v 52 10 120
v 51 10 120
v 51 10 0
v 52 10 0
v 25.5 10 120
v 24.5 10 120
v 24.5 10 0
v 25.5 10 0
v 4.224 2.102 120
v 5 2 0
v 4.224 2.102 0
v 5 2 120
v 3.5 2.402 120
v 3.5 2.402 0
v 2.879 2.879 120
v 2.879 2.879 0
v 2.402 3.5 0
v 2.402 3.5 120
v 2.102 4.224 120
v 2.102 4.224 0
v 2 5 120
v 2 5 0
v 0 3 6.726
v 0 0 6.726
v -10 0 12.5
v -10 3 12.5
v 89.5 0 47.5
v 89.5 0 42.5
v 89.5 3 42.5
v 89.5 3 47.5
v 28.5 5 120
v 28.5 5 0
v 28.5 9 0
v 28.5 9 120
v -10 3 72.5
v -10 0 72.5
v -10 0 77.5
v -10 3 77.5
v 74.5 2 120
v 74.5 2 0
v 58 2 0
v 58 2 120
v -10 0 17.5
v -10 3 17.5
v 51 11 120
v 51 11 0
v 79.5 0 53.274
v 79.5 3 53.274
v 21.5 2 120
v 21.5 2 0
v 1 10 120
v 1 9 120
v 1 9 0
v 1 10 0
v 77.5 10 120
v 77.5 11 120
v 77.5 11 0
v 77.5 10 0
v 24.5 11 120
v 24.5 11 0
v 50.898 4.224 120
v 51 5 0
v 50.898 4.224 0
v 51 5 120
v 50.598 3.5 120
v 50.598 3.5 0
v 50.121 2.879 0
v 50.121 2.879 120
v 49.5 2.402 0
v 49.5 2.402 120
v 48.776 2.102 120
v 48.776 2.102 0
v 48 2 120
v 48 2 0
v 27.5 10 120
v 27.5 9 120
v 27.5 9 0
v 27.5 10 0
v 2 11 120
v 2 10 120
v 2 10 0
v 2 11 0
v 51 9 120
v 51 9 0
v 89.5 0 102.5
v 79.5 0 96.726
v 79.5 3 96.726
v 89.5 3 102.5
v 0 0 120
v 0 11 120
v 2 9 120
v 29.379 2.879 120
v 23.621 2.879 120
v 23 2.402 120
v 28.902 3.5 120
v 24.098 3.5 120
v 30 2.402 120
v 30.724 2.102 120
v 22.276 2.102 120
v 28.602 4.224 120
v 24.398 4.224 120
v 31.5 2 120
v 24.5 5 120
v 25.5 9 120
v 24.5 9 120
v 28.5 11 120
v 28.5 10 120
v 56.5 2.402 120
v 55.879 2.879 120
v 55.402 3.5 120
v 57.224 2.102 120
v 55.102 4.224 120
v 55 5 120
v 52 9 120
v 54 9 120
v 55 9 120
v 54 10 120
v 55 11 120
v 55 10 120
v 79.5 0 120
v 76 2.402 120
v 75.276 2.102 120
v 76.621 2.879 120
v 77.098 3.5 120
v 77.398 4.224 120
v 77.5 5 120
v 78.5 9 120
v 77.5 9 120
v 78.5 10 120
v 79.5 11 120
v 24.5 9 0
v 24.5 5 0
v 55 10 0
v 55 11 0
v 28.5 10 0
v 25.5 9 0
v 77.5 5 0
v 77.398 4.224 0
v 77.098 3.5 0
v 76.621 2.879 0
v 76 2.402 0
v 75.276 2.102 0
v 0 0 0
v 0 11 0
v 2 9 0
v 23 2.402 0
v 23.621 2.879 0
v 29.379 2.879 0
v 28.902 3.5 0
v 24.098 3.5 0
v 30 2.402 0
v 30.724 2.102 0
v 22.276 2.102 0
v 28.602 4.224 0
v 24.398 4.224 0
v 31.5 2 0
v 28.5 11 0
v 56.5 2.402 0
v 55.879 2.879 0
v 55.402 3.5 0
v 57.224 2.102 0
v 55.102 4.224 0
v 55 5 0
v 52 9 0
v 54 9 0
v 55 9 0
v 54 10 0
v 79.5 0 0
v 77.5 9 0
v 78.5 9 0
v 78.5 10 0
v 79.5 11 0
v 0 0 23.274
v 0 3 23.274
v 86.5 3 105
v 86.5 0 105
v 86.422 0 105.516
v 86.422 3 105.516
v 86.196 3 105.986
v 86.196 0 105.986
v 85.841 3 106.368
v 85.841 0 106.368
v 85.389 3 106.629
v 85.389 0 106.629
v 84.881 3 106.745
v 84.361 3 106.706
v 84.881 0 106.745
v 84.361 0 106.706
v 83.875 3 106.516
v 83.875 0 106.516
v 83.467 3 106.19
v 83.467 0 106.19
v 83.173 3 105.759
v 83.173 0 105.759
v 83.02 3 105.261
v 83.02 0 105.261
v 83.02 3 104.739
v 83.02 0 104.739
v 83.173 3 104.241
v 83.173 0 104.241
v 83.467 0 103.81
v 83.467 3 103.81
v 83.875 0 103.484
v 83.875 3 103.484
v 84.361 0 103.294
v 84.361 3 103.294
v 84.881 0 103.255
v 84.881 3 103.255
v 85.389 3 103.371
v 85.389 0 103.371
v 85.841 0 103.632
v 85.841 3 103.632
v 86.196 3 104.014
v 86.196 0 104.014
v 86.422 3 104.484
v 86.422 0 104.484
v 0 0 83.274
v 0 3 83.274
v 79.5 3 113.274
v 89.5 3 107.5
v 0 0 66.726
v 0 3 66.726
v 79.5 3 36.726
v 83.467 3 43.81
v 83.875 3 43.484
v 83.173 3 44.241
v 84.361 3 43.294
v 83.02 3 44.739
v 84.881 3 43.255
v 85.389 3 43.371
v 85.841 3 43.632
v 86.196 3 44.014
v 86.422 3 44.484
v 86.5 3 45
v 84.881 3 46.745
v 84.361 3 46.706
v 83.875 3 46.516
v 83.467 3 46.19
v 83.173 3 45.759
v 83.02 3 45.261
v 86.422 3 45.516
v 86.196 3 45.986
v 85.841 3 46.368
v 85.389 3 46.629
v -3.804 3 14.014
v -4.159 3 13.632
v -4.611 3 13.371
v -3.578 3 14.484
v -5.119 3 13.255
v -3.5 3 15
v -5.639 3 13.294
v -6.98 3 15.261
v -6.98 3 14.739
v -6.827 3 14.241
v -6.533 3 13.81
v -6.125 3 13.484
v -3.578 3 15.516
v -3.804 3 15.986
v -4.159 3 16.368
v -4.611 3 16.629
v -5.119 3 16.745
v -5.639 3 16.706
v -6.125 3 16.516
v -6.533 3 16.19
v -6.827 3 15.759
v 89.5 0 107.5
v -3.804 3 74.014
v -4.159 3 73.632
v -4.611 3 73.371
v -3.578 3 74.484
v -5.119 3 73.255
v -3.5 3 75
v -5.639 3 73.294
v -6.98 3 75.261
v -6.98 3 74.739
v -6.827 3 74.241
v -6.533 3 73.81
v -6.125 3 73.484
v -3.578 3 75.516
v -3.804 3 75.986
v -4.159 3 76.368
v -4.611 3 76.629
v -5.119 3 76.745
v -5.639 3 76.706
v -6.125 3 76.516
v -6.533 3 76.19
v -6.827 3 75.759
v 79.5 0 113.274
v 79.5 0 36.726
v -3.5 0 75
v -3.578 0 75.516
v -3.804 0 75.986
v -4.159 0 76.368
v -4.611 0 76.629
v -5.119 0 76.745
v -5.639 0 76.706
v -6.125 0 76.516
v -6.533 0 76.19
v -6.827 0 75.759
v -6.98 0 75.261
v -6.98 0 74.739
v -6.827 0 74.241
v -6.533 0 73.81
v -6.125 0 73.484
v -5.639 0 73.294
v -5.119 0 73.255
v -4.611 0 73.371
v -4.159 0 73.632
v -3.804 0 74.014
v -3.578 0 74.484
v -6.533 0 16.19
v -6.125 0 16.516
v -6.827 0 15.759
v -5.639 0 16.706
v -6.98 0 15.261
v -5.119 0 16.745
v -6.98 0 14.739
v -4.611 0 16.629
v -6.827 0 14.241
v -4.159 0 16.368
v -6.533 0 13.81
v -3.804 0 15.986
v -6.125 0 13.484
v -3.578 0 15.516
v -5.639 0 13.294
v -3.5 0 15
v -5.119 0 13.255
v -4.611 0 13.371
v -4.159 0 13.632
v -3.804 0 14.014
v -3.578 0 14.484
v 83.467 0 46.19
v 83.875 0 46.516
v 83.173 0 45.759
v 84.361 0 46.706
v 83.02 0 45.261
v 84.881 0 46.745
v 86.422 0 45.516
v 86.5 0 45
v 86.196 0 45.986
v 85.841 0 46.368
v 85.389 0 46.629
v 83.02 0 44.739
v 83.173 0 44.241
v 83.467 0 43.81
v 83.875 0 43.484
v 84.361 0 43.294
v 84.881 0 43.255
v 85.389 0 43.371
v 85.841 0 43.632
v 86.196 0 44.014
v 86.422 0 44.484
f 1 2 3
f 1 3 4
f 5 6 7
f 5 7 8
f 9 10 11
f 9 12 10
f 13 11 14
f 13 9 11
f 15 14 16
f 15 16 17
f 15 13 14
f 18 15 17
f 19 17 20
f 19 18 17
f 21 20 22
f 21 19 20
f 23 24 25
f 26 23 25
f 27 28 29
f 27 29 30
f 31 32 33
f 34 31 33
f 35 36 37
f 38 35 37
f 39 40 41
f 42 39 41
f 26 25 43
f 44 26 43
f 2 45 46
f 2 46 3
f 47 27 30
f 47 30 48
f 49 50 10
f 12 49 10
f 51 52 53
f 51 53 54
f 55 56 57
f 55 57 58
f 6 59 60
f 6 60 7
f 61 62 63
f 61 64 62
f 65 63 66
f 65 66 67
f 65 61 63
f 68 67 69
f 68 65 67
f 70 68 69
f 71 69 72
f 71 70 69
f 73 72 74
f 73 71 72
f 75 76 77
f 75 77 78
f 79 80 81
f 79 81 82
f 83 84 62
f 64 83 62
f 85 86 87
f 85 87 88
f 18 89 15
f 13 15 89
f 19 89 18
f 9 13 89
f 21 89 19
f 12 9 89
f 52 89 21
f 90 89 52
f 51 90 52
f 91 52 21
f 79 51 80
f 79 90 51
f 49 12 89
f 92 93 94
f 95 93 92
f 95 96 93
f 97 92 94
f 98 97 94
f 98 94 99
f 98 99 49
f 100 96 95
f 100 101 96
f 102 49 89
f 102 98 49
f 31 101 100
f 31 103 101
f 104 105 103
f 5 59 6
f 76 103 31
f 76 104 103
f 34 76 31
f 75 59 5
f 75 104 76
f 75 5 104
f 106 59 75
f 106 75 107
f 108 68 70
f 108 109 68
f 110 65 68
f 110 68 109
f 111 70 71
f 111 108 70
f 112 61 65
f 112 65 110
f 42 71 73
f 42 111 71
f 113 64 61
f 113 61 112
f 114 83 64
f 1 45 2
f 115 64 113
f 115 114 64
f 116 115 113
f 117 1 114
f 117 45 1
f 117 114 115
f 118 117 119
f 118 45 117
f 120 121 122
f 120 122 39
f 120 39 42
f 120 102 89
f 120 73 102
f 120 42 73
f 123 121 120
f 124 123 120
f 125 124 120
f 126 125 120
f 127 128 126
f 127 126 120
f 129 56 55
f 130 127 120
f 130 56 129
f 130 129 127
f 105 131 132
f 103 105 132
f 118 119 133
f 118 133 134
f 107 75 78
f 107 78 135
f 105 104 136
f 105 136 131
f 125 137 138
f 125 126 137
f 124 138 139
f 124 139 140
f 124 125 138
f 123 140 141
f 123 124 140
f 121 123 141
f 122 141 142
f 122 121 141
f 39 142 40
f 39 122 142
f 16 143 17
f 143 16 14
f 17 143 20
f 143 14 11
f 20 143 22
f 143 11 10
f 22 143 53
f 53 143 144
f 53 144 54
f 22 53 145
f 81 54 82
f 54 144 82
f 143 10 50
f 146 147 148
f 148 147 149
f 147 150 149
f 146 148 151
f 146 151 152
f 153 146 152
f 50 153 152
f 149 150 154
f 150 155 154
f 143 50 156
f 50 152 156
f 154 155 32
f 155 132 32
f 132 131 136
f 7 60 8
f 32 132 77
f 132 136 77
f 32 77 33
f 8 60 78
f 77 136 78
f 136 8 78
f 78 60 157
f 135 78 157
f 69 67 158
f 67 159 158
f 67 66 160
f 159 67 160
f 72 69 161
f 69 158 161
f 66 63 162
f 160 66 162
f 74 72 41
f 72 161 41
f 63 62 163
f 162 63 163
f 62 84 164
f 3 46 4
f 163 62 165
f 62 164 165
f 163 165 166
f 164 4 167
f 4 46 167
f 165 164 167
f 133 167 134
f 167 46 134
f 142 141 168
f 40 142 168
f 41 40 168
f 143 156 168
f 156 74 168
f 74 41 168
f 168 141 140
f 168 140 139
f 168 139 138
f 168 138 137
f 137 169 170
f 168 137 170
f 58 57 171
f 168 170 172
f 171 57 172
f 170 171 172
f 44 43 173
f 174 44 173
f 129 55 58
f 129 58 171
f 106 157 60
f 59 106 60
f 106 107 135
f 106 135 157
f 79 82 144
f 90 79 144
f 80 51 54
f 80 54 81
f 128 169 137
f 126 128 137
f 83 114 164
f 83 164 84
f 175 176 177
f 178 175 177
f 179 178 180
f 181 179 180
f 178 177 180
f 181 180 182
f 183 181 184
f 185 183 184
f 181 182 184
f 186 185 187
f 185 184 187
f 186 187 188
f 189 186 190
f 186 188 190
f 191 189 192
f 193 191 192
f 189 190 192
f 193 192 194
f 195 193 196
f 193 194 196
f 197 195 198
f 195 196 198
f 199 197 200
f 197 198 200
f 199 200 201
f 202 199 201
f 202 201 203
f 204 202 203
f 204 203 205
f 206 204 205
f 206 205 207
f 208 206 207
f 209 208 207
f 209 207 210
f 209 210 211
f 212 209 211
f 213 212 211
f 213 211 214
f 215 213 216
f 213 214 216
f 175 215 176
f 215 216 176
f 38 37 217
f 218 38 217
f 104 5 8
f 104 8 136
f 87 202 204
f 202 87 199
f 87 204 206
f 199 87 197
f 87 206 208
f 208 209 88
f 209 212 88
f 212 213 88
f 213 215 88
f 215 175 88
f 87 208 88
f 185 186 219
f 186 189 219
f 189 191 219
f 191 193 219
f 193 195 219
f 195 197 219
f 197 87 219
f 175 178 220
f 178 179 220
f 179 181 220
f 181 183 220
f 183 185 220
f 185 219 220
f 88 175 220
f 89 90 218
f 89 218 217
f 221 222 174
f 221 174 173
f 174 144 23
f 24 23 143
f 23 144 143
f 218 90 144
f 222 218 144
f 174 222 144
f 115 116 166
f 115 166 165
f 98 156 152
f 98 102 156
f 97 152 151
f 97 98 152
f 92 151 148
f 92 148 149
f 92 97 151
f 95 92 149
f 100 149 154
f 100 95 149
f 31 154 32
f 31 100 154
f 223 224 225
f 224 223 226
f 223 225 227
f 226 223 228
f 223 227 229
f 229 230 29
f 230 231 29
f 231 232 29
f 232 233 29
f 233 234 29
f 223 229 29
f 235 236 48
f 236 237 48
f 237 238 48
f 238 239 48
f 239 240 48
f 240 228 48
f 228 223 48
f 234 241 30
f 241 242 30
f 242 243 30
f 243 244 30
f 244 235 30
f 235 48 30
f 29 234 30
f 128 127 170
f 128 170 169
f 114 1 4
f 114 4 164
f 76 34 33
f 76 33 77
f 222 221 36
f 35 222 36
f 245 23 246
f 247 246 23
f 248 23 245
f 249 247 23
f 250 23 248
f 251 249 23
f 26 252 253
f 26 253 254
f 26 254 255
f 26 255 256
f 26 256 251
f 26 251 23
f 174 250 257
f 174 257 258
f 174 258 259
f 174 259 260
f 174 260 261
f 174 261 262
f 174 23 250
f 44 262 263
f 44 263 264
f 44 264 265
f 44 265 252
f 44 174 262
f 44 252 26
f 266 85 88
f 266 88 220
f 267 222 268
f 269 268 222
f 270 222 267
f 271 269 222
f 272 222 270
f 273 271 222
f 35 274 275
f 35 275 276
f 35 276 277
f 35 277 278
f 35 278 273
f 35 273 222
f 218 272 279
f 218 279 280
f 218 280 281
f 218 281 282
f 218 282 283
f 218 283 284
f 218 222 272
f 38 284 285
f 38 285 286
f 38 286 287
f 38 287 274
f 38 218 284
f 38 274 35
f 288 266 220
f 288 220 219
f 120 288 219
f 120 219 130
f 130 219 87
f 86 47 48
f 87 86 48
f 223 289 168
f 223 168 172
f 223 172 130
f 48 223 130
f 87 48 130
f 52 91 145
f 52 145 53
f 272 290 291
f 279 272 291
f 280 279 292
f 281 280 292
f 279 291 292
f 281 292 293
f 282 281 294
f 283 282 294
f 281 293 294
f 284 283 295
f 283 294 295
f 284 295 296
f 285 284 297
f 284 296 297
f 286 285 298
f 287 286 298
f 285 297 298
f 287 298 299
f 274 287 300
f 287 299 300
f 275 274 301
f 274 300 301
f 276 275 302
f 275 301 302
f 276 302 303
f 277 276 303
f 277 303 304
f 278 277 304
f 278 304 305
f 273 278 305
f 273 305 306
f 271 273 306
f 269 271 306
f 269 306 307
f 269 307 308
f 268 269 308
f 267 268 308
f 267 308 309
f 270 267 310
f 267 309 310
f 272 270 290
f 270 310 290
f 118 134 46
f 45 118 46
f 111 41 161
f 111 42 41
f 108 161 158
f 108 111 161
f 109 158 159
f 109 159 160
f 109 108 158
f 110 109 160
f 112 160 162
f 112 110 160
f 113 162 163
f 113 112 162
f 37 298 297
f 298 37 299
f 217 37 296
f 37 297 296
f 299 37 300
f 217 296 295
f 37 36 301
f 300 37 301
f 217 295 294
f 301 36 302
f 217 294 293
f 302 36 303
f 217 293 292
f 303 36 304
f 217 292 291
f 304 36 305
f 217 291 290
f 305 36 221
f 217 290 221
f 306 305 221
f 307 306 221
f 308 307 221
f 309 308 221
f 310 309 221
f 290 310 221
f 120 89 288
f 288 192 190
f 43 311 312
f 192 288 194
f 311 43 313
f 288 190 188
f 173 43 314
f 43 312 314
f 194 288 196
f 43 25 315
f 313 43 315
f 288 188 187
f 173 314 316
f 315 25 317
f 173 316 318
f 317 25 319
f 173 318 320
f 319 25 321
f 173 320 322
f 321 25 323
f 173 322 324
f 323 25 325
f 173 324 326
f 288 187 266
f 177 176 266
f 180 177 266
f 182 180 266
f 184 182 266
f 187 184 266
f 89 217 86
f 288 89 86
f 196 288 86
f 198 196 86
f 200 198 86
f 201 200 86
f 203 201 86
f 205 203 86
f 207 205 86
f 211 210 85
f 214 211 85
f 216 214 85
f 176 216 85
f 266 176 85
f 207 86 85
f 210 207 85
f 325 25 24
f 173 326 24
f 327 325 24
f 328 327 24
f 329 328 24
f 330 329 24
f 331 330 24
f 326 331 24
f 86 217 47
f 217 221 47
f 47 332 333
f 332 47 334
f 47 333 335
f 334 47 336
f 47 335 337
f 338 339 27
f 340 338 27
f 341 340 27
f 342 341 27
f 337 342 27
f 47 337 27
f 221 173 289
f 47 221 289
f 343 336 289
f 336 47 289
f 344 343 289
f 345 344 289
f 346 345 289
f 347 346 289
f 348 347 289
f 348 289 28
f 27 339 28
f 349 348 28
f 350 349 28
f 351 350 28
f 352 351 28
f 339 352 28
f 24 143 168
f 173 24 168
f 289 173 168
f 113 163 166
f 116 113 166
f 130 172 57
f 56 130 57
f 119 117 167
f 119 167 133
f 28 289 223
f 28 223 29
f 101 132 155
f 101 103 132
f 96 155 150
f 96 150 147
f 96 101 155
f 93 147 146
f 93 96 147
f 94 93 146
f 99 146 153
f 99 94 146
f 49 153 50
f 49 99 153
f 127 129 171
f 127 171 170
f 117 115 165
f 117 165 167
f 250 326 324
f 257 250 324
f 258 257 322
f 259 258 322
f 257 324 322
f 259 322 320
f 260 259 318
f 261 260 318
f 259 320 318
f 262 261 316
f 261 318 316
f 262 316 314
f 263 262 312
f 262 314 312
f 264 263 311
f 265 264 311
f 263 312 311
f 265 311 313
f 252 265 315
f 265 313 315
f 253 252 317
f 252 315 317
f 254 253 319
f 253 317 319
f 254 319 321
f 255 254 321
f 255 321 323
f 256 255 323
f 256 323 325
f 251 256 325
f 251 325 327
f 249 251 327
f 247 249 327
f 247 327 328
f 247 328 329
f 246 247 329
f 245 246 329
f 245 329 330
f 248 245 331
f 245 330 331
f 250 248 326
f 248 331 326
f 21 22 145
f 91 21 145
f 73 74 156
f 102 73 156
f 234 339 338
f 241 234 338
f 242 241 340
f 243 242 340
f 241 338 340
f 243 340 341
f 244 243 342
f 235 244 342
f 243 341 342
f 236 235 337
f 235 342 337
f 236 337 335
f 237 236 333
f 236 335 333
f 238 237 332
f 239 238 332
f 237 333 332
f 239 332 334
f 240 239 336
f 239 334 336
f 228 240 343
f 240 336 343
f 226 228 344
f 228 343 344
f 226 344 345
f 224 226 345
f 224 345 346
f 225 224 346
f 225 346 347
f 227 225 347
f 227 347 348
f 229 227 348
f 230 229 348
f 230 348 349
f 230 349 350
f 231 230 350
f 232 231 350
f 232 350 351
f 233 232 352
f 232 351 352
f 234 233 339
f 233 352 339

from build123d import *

# Parameters (mm, degrees)
PAD_DEPTH    = 120
SKETCH001_R  = 1.75
PAD001_DEPTH = 3
FILLET_R     = 3


with BuildPart() as part:
    # Sketch → Pad (new body)
    with BuildSketch(Plane.XY):
        Polygon((0, 0), (79.5, 0), (79.5, 11), (77.5, 11), (77.5, 10), (78.5, 10), (78.5, 9), (77.5, 9), (77.5, 2), (55, 2), (55, 9), (54, 9), (54, 10), (55, 10), (55, 11), (51, 11), (51, 10), (52, 10), (52, 9), (51, 9), (51, 2), (28.5, 2), (28.5, 9), (27.5, 9), (27.5, 10), (28.5, 10), (28.5, 11), (24.5, 11), (24.5, 10), (25.5, 10), (25.5, 9), (24.5, 9), (24.5, 2), (2, 2), (2, 9), (1, 9), (1, 10), (2, 10), (2, 11), (0, 11), align=None)
    extrude(amount=PAD_DEPTH)

    # Sketch001 → Pad001 (join)
    with BuildSketch(Plane.XZ):
        Polygon((0, 6.726497), (-10, 12.5), (-10, 17.5), (0, 23.273503), align=None)
        with Locations((-5.25, 15)):
            Circle(SKETCH001_R, mode=Mode.SUBTRACT)
        Polygon((0, 66.726497), (-10, 72.5), (-10, 77.5), (0, 83.273503), align=None)
        with Locations((-5.25, 75)):
            Circle(SKETCH001_R, mode=Mode.SUBTRACT)
        Polygon((79.5, 36.726497), (89.5, 42.5), (89.5, 47.5), (79.5, 53.273503), align=None)
        with Locations((84.75, 45)):
            Circle(SKETCH001_R, mode=Mode.SUBTRACT)
        Polygon((79.5, 96.726497), (89.5, 102.5), (89.5, 107.5), (79.5, 113.273503), align=None)
        with Locations((84.75, 105)):
            Circle(SKETCH001_R, mode=Mode.SUBTRACT)
    extrude(amount=-PAD001_DEPTH)

    # Fillet
    fillet_edges = [part.edges().sort_by_distance(p)[0] for p in [
        (2, 2, 60),
        (28.5, 2, 60),
        (55, 2, 60),
        (24.5, 2, 60),
        (51, 2, 60),
        (77.5, 2, 60),
    ]]
    fillet(fillet_edges, radius=FILLET_R)


solid = part.part
